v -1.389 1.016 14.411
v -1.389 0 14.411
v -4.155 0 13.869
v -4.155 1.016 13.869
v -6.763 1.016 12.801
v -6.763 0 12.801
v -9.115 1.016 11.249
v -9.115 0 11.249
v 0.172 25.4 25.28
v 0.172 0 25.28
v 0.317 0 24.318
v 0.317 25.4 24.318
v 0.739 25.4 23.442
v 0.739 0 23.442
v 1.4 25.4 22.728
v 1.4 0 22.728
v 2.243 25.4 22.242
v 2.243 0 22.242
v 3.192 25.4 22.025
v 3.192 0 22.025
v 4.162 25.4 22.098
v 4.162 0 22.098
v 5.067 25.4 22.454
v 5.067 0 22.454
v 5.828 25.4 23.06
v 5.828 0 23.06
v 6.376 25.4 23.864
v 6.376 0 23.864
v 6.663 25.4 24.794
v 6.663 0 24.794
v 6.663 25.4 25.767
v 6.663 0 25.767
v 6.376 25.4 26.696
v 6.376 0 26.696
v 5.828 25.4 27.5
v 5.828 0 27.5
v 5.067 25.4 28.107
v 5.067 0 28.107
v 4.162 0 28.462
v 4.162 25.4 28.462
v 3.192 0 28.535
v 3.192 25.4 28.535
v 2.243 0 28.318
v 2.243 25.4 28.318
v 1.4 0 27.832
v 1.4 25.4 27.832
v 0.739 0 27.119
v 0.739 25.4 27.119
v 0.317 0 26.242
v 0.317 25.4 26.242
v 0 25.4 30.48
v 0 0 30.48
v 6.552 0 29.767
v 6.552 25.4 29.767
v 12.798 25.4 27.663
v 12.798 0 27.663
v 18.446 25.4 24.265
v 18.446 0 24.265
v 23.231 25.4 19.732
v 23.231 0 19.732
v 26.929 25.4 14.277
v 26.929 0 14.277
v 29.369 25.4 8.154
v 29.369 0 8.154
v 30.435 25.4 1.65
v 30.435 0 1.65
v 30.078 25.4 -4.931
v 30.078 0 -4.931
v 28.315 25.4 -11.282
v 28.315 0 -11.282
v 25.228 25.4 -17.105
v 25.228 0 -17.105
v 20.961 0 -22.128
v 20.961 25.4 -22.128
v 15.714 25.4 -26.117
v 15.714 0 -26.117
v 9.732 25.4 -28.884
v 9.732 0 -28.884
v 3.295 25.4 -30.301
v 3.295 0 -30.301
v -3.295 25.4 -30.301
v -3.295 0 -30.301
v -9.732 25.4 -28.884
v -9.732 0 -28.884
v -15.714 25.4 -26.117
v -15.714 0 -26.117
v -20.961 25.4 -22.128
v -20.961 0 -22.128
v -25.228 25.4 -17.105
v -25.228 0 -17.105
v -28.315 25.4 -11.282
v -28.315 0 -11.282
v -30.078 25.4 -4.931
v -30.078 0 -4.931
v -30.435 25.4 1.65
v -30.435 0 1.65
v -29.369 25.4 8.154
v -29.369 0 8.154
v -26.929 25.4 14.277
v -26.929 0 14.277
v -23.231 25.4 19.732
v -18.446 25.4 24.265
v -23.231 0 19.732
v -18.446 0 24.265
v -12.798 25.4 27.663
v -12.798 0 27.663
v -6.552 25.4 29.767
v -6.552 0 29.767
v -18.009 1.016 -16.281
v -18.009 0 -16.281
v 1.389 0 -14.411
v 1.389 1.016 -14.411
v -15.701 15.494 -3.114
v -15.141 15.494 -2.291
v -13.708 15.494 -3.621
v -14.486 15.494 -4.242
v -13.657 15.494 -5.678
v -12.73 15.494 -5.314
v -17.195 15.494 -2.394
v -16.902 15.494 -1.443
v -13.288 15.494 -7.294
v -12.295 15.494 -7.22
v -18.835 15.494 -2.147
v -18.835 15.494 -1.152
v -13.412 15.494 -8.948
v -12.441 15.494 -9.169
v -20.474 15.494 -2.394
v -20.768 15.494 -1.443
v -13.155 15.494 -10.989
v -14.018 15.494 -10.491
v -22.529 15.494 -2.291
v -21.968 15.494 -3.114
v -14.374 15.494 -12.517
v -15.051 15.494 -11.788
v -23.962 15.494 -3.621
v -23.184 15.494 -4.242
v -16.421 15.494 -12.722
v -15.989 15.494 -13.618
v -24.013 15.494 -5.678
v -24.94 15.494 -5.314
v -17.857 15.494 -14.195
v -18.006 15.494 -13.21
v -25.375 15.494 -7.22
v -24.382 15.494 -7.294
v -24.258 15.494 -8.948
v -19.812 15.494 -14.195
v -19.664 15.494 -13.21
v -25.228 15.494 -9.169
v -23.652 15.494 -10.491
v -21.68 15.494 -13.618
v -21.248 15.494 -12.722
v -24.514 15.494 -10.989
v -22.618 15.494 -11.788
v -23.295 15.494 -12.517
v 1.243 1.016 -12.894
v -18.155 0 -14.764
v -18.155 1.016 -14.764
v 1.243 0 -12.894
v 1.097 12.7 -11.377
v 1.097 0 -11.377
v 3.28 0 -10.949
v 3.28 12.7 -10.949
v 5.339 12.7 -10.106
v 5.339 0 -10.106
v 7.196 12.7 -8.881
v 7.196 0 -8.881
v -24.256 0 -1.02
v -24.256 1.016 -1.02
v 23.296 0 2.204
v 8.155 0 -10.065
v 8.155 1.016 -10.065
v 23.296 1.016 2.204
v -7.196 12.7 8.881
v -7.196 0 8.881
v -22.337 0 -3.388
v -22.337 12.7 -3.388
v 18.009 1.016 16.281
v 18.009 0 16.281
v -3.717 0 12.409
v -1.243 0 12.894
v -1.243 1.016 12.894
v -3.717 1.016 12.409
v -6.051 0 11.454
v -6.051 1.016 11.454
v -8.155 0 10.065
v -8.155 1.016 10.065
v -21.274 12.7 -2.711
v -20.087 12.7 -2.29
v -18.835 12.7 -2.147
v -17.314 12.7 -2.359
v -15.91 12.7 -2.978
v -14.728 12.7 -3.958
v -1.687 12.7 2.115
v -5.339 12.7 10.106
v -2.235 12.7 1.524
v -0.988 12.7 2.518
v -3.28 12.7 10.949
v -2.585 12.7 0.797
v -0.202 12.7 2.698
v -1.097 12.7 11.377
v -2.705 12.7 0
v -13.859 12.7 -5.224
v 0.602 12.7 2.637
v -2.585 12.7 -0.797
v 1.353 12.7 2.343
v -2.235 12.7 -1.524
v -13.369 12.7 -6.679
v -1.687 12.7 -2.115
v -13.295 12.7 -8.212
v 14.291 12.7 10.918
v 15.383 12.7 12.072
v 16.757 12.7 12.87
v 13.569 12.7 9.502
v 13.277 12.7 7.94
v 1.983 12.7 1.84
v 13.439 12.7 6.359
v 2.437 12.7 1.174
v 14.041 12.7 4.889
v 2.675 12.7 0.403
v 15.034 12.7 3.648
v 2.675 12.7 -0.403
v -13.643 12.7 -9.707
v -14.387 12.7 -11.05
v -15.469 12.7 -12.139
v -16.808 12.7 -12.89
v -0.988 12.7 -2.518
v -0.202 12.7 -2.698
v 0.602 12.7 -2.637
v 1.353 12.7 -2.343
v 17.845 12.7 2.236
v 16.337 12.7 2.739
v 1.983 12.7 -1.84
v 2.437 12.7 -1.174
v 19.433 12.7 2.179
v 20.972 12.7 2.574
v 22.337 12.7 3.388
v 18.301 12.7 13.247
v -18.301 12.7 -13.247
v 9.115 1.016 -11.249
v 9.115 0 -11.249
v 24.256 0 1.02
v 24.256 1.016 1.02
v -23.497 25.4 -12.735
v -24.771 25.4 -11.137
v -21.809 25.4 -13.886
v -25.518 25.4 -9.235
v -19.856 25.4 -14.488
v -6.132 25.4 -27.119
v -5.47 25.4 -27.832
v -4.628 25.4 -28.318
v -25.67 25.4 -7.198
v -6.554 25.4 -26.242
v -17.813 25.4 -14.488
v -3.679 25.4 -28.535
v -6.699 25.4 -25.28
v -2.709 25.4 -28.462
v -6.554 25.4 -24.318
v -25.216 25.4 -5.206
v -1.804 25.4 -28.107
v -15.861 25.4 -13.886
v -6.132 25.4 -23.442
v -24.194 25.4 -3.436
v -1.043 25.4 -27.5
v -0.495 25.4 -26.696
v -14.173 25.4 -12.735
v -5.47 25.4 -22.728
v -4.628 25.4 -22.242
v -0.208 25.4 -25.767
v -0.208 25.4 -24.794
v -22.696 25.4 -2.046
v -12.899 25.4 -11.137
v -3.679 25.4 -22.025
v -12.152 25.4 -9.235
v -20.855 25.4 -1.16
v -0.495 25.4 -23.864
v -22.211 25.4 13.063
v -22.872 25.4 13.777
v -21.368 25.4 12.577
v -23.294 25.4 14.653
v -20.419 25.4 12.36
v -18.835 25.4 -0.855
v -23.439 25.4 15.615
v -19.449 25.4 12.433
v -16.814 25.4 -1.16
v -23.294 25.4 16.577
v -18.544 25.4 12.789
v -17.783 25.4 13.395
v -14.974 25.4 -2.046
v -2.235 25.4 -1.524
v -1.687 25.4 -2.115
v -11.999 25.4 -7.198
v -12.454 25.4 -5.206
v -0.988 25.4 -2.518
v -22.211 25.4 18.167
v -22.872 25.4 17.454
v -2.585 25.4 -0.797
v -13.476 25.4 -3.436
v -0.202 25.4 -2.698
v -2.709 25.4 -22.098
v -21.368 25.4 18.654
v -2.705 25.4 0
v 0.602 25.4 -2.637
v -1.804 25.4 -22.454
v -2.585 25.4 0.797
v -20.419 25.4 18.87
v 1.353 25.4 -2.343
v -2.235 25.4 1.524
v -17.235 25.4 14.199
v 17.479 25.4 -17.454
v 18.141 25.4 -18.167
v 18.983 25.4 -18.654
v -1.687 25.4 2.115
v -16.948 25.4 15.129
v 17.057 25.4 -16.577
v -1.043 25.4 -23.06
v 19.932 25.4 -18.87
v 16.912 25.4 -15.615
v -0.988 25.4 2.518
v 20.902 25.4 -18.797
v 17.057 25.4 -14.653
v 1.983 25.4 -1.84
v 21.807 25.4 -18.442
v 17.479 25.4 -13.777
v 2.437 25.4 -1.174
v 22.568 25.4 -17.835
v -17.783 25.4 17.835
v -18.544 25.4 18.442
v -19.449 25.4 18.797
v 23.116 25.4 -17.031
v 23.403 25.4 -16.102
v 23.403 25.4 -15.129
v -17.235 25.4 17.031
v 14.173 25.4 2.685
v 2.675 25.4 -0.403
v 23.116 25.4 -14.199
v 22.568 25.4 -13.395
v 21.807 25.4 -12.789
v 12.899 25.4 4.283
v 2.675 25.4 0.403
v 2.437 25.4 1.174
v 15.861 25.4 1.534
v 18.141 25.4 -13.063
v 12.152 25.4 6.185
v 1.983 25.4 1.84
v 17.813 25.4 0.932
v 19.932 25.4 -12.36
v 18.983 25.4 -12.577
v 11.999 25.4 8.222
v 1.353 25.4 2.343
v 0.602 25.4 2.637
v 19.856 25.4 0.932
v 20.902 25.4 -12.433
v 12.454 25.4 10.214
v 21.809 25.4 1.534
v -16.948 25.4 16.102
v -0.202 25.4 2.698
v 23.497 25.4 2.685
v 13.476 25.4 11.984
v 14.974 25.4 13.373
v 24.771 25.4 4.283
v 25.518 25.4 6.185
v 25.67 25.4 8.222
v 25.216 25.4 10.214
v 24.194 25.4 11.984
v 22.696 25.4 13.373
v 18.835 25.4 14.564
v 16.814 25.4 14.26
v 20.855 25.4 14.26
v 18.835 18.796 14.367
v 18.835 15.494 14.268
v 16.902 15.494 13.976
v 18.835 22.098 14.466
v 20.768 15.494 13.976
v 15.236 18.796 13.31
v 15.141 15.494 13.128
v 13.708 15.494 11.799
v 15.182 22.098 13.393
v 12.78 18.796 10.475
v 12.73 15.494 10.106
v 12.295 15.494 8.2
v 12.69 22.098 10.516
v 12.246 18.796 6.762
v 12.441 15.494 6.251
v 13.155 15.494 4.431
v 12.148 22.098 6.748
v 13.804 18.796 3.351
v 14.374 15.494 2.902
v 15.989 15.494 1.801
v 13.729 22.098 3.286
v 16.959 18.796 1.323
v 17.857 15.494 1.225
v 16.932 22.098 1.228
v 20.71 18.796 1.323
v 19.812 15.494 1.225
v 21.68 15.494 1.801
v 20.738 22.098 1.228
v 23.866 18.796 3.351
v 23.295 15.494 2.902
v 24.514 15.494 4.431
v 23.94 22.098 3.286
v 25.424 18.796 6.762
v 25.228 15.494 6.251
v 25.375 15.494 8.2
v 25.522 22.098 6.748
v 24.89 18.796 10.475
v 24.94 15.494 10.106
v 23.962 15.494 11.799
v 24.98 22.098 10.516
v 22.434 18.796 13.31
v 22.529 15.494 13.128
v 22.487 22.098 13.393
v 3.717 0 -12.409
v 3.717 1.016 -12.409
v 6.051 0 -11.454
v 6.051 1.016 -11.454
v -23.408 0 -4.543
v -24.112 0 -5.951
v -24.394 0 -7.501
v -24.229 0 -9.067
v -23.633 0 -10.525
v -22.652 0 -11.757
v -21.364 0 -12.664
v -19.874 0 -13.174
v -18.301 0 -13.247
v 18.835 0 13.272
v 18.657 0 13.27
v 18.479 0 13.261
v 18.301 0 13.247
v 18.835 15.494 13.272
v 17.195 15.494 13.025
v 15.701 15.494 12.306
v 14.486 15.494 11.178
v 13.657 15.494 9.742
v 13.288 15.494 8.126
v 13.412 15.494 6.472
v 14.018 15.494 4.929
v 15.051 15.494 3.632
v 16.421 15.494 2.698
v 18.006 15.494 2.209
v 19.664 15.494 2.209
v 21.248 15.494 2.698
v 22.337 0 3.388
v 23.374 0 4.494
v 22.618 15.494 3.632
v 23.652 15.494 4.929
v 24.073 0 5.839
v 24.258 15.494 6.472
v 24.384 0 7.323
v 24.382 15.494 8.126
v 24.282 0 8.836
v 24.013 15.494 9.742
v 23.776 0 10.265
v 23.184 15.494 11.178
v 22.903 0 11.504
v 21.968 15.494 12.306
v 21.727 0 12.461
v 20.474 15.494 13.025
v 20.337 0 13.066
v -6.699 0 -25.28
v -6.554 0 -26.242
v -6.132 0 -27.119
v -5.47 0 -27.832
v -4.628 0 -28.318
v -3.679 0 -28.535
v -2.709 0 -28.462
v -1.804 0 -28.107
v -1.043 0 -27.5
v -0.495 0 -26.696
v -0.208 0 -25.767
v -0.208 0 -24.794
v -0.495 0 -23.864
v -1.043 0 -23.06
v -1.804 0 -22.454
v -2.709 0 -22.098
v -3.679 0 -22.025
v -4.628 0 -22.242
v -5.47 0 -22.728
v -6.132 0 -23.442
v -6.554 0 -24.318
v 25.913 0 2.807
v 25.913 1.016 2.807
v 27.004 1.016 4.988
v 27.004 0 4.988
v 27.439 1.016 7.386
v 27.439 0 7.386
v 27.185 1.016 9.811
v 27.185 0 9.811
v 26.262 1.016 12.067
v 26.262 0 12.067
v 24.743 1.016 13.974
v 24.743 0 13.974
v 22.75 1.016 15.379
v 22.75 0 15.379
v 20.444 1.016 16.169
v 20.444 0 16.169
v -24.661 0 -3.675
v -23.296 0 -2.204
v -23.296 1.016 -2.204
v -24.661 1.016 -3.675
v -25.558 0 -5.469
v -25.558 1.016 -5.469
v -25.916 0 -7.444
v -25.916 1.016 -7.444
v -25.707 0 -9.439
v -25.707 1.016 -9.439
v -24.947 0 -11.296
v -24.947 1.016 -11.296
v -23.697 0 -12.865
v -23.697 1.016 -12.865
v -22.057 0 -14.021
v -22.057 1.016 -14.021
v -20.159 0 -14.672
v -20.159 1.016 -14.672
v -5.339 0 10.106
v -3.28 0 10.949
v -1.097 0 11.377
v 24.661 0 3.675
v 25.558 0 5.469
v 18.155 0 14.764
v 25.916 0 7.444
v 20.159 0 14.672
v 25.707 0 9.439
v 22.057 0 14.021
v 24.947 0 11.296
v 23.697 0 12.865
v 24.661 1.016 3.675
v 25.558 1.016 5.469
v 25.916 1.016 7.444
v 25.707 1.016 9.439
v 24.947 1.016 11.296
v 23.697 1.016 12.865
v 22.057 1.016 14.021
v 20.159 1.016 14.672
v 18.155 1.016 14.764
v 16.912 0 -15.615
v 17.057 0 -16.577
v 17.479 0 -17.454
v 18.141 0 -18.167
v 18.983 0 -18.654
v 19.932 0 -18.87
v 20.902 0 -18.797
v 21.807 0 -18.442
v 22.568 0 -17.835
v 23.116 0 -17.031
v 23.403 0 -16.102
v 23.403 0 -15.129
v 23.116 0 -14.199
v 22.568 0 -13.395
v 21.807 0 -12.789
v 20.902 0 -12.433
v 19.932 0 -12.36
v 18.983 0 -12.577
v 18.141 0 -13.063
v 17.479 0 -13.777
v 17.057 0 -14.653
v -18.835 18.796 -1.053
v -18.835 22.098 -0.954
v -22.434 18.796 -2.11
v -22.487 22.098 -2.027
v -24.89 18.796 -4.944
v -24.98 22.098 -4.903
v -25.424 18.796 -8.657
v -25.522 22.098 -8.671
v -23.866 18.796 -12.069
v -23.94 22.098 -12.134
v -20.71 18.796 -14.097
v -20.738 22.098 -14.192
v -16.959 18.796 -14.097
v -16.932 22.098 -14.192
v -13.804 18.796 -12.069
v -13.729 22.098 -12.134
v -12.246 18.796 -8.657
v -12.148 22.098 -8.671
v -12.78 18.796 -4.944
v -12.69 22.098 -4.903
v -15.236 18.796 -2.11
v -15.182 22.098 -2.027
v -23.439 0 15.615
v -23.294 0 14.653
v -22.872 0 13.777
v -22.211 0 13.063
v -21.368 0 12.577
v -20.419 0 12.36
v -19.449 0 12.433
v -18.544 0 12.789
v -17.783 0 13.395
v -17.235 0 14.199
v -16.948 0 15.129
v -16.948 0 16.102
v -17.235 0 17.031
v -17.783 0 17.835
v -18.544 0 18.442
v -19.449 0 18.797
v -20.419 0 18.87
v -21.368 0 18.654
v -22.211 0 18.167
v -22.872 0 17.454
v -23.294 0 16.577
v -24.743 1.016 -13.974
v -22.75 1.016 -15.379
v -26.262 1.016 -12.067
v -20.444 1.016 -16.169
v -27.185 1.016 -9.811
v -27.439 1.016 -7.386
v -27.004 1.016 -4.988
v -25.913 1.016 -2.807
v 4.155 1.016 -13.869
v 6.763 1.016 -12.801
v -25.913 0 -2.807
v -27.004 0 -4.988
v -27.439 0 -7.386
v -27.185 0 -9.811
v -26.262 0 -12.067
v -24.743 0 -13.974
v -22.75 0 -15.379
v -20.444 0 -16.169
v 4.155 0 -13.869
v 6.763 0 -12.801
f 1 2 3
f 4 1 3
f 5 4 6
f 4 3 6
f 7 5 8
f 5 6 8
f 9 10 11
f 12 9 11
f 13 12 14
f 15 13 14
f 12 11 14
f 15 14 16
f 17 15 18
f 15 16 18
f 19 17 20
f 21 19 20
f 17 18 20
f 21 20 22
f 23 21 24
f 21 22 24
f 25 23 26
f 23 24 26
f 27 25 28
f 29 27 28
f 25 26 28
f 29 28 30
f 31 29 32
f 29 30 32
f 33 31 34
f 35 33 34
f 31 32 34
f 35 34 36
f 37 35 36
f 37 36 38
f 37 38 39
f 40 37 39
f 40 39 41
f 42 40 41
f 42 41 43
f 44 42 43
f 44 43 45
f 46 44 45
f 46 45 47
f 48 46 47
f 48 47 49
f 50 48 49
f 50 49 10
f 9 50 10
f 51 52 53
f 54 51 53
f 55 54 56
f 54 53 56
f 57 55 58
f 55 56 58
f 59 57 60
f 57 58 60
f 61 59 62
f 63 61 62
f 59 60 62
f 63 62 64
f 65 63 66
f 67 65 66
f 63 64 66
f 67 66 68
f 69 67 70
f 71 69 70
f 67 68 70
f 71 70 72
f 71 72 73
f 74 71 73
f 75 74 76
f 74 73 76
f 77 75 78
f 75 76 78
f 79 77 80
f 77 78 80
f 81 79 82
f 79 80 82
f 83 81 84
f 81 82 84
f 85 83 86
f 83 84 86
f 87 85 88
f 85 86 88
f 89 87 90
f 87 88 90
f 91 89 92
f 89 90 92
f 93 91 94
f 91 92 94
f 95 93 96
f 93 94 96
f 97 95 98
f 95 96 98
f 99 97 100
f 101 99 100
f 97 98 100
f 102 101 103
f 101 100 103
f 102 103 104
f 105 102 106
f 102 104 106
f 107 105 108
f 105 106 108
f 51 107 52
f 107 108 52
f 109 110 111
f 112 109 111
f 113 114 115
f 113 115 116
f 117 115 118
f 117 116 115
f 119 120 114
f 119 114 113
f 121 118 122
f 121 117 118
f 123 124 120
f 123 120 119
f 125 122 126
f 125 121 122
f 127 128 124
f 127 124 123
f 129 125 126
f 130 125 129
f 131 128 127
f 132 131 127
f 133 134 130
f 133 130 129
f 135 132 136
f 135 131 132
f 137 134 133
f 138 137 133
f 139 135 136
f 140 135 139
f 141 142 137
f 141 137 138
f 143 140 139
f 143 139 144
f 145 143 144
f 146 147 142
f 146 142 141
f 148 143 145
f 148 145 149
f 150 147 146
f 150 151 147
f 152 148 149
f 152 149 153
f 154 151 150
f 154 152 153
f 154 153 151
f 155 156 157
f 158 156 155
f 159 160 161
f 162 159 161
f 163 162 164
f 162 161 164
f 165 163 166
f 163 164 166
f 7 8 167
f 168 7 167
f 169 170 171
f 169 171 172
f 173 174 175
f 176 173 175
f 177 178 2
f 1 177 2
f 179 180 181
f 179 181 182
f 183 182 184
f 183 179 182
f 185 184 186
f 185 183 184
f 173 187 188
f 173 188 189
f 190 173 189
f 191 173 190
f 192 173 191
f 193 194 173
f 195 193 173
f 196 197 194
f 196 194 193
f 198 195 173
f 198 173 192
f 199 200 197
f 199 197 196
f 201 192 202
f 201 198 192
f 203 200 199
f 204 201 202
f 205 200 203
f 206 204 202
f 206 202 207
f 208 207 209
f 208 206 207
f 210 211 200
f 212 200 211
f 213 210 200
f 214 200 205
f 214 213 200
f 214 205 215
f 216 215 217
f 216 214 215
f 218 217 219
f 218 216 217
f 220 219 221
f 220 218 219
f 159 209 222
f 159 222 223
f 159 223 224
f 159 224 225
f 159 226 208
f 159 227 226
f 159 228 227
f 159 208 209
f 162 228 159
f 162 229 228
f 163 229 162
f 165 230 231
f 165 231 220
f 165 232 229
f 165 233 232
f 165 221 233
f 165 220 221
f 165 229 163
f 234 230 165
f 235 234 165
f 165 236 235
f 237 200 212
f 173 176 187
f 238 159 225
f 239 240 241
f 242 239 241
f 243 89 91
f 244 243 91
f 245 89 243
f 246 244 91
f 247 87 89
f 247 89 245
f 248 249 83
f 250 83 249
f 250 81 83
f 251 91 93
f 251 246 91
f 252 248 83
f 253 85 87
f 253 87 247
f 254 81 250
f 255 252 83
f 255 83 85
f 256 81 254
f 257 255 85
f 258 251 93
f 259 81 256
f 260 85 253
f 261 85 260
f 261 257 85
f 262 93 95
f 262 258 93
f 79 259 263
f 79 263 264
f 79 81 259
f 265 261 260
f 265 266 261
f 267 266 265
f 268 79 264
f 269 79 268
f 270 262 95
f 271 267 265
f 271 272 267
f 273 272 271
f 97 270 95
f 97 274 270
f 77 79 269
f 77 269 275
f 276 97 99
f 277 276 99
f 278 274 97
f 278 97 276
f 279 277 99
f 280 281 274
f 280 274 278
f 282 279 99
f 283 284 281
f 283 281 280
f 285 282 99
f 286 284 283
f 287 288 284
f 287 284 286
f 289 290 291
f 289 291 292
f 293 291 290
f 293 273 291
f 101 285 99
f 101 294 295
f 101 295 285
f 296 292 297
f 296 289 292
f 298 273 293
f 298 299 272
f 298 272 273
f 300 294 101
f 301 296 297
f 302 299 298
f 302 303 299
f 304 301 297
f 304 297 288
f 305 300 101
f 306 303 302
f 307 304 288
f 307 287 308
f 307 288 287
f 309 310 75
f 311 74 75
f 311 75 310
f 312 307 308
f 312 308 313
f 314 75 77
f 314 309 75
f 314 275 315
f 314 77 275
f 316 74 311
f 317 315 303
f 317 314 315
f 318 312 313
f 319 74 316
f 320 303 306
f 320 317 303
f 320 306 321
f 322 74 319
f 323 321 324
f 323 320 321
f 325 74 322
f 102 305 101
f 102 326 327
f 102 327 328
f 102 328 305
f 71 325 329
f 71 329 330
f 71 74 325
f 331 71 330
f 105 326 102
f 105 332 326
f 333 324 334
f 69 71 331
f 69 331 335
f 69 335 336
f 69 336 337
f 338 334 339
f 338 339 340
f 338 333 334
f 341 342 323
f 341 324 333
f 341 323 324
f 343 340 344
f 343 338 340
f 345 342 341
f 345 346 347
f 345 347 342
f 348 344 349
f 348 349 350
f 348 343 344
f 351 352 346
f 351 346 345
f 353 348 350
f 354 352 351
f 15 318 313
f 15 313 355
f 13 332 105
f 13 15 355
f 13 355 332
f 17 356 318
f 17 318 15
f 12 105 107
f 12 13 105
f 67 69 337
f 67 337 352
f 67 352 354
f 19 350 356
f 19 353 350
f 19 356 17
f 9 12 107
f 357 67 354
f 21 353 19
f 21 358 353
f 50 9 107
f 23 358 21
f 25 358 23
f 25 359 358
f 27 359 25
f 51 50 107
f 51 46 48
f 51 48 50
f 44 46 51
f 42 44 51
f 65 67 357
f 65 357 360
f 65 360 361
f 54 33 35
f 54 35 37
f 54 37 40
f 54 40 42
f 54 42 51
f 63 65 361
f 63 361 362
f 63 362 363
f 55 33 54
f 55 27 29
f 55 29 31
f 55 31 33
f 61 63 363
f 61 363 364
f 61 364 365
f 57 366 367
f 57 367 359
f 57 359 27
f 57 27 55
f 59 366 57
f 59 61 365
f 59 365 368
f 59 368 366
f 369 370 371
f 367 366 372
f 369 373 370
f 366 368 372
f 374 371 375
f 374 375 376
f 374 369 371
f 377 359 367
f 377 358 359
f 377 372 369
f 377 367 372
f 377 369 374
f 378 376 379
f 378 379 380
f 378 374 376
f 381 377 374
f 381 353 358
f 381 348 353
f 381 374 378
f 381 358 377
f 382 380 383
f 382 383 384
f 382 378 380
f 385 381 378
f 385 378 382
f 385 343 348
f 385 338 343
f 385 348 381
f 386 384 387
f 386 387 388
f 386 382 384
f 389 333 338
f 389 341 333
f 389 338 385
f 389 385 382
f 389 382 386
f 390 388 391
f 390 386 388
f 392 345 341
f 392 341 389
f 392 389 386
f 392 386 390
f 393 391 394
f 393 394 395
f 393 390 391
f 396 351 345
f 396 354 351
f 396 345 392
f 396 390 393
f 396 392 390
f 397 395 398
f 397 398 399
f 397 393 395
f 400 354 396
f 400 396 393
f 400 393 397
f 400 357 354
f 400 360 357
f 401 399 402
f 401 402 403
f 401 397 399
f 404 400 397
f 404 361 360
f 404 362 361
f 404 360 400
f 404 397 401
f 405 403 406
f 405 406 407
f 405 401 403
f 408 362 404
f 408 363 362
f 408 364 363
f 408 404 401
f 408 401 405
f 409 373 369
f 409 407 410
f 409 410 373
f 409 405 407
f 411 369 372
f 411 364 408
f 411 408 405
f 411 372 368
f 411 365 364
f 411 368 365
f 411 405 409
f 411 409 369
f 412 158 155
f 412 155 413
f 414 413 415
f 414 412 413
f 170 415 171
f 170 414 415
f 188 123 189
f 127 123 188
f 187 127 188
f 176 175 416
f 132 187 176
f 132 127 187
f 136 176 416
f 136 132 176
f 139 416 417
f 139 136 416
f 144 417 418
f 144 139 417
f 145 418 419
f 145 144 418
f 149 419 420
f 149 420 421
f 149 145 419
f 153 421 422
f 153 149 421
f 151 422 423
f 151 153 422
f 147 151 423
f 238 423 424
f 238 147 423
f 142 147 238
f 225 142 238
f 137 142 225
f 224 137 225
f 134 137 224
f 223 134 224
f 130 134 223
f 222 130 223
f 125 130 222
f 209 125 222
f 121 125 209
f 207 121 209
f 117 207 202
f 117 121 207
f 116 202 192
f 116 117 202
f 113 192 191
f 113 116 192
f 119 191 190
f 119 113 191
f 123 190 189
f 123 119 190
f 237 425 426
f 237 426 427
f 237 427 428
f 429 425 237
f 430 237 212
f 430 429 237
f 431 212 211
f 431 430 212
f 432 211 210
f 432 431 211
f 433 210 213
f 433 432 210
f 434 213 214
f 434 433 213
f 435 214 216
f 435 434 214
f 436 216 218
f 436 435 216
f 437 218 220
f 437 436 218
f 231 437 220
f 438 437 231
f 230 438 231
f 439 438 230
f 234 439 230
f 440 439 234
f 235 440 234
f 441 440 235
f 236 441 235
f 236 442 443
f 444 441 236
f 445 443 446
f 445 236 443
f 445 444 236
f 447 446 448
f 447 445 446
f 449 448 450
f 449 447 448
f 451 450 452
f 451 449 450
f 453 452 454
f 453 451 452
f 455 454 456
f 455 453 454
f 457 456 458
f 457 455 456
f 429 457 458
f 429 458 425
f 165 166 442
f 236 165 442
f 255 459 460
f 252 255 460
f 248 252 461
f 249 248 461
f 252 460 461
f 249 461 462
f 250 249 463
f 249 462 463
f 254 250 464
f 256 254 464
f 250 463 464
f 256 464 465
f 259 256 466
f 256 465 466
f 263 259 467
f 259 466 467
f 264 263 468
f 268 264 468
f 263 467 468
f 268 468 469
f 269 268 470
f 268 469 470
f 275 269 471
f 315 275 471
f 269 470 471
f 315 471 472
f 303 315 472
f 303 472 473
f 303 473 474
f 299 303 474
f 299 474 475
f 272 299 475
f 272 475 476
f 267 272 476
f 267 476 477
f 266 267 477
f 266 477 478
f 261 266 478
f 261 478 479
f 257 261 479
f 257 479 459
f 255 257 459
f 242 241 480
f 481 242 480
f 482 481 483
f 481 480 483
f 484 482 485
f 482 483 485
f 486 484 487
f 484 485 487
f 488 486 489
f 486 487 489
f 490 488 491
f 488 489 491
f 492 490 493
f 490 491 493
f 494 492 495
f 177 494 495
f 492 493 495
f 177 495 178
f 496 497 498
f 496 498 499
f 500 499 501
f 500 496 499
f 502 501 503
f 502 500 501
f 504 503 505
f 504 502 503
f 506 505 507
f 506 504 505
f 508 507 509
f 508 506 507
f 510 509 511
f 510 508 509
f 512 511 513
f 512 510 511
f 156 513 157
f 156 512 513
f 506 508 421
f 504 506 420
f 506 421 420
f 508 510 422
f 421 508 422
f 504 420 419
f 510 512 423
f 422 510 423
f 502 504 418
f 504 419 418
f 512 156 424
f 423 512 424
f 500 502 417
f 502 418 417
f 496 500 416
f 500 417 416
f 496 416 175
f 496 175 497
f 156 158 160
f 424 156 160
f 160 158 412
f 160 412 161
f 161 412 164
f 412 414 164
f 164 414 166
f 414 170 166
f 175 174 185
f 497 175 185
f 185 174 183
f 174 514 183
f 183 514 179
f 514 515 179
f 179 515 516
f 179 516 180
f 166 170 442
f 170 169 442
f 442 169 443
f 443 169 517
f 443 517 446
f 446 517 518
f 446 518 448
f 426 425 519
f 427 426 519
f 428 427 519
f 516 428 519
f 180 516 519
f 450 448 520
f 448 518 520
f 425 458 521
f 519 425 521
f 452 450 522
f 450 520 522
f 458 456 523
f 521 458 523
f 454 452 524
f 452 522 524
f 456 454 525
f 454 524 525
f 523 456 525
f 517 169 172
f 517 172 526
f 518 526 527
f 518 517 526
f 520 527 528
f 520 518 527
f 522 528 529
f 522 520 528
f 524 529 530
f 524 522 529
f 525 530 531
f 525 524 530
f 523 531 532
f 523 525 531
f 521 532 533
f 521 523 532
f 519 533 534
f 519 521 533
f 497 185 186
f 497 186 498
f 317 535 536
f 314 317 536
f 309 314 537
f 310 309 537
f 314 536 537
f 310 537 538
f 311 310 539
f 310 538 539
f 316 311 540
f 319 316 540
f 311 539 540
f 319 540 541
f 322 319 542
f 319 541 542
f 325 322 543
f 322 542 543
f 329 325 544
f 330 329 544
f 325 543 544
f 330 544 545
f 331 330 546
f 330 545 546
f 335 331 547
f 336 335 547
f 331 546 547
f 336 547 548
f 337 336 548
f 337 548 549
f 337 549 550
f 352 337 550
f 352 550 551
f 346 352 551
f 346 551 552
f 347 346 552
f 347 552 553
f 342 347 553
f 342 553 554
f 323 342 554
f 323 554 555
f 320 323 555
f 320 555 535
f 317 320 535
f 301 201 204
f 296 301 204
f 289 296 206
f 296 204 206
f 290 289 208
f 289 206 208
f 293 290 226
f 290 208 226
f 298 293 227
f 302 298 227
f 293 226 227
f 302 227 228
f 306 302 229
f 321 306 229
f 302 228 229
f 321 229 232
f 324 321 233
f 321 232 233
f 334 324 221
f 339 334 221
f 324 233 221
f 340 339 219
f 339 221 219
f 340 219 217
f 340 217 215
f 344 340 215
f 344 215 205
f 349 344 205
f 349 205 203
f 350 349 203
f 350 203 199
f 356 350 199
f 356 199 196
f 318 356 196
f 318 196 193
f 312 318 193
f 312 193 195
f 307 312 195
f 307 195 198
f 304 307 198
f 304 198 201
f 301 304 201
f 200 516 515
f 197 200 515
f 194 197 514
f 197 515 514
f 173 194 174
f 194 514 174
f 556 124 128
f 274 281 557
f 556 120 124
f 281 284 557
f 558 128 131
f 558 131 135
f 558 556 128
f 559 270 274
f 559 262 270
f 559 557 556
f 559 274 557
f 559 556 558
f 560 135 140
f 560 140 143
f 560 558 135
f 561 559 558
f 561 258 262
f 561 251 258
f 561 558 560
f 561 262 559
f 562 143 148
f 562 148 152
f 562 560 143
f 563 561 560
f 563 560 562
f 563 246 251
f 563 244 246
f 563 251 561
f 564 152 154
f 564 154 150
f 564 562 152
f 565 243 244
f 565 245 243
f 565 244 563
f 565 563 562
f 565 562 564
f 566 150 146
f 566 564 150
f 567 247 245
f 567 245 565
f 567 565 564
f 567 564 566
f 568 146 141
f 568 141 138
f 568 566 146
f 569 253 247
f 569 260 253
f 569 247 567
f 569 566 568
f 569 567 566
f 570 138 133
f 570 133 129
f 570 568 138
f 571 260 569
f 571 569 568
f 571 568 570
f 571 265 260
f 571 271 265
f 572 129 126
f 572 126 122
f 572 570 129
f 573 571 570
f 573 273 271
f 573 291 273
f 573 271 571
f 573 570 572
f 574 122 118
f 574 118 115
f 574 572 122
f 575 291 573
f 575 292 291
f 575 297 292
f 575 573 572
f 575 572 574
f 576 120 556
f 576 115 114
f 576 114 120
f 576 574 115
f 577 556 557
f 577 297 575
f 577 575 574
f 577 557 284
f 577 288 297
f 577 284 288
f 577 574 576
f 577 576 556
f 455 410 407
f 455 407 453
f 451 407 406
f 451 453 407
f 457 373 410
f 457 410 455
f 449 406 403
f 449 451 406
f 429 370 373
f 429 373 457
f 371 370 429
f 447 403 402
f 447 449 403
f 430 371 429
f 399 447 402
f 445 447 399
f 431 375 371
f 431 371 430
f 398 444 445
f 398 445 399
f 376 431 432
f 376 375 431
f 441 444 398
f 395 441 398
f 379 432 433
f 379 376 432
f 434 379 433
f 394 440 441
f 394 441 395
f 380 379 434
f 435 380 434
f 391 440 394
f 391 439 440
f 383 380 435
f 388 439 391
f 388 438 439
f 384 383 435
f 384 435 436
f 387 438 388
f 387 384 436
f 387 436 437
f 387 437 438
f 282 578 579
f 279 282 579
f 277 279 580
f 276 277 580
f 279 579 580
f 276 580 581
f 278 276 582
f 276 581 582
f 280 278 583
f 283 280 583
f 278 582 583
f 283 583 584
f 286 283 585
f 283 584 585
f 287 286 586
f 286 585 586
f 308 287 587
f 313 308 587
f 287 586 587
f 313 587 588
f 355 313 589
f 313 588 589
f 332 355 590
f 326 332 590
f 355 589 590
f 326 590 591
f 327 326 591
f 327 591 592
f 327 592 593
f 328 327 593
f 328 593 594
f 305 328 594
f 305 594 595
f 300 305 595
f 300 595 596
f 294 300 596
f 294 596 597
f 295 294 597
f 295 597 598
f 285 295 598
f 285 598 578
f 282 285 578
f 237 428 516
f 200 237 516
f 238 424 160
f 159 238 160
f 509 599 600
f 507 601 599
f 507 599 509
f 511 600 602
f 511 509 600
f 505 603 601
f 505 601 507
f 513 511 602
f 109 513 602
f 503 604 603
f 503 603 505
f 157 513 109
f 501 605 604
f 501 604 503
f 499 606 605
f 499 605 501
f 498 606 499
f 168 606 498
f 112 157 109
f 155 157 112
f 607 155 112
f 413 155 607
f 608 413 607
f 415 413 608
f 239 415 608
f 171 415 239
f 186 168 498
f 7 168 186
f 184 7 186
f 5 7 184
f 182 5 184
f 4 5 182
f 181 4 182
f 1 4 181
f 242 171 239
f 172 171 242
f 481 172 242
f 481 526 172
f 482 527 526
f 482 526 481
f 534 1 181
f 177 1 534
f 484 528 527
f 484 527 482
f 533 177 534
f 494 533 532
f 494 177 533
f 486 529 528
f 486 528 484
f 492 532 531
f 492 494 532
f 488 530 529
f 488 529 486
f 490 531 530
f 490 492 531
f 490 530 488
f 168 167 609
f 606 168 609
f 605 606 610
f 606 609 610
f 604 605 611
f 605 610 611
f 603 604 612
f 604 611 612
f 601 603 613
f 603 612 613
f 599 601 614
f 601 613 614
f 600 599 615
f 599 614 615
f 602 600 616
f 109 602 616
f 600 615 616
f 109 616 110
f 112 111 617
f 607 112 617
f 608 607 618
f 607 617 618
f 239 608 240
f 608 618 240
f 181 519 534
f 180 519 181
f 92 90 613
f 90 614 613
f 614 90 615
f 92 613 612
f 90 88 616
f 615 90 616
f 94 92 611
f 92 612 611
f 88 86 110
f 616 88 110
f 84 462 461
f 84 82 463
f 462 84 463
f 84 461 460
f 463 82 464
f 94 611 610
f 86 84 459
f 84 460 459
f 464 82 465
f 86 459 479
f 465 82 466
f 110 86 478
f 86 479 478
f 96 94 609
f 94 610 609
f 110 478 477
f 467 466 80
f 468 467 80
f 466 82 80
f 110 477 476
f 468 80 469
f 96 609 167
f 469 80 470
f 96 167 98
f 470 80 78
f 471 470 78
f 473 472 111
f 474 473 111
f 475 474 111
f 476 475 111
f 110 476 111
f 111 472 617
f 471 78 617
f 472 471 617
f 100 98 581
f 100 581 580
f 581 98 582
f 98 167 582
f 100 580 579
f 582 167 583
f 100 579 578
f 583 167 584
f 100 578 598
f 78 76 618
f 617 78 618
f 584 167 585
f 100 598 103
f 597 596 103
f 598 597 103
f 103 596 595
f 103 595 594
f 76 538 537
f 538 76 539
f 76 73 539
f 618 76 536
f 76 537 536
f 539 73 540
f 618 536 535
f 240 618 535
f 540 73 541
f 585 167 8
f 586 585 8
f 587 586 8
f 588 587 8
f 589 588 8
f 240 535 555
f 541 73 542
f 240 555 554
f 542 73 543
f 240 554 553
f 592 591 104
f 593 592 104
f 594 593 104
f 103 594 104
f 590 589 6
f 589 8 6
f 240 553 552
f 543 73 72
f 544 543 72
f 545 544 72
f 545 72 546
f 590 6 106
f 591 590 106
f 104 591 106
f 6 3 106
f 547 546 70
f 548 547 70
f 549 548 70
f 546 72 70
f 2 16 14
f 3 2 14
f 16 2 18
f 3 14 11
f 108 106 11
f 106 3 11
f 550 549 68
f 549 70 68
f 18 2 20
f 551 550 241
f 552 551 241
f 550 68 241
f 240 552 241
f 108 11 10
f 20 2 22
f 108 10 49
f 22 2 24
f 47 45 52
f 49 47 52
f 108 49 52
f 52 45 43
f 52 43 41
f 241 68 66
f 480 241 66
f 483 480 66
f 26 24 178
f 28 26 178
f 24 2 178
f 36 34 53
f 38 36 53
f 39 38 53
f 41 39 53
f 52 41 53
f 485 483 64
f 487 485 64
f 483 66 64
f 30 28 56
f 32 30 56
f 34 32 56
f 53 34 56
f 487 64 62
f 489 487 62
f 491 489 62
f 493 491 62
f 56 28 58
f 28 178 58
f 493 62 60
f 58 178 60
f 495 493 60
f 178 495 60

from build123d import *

# Parameters (mm, degrees)
SKETCH1_R                         = 30.48
BOSS_EXTRUDE1_DEPTH               = 25.4
F_1_4_28_TAPPED_HOLE1_D           = 5.4102
SKETCH7_R                         = 11.43
CUT_EXTRUDE2_DEPTH                = 12.7
F_1_4_CLEARANCE_HOLE1_D           = 6.5278
F_1_4_NPT_TAPPED_HOLE1_AT_2_COUNT = 2
F_1_4_NPT_TAPPED_HOLE1_AT_2_PITCH = 40.7035
CUT_EXTRUDE3_DEPTH                = 12.7
GASKET_SLOT_DEPTH                 = 1.016


with BuildPart() as part:
    # Sketch1 → Boss-Extrude1 (new body)
    with BuildSketch(Plane(origin=(0, 0, 0), x_dir=(1, 0, 0), z_dir=(0, 1, 0))):
        with Locations(Location((0, 0, 0), (0, 0, 270))):
            Circle(SKETCH1_R)
    extrude(amount=BOSS_EXTRUDE1_DEPTH)

    # 1/4-28 Tapped Hole1 (through all)
    with Locations(Plane(origin=(0, 25.4, 0), x_dir=(1, 0, 0), z_dir=(0, 1, 0))):
        with Locations((0, 0)):
            Hole(F_1_4_28_TAPPED_HOLE1_D / 2)

    # Sketch7 → Cut-Extrude2 (cut)
    with BuildSketch(Plane.XZ):
        with Locations(Location((0, 0, 0), (0, 0, 270))):
            Circle(SKETCH7_R)
    extrude(amount=-CUT_EXTRUDE2_DEPTH, mode=Mode.SUBTRACT)

    # 1/4 Clearance Hole1 (through all)
    with Locations(Plane(origin=(0, 25.4, 0), x_dir=(1, 0, 0), z_dir=(0, 1, 0))):
        with Locations((20.175514493, 15.615257641), (3.435452557, -25.280136906), (-3.435452557, 25.280136906), (-20.175514493, -15.615257641)):
            Hole(F_1_4_CLEARANCE_HOLE1_D / 2)

    # Sketch12 → 1/4 NPT Tapped Hole1 (revolve, cut)
    with BuildSketch(Plane(origin=(-18.83486521, 25.4, -7.709836613), x_dir=(0, 0, 1), z_dir=(1, 0, 0))):
        Polygon((0, 0), (0, 25.4), (5.5626, 25.4), (5.5626, 9.906), (6.557984794, 9.906), (6.8545837, 0), align=None)
    f_1_4_npt_tapped_hole1 = revolve(axis=Axis((-18.83486521, 31.75, -7.709836613), (0, -1, 0)), mode=Mode.SUBTRACT)

    # 1/4 NPT Tapped Hole1 at 2: 1/4 NPT Tapped Hole1 ×2
    with Locations(*[Vector(0.9254666163685309, 0, 0.37882917256645177) * (i * F_1_4_NPT_TAPPED_HOLE1_AT_2_PITCH) for i in range(1, F_1_4_NPT_TAPPED_HOLE1_AT_2_COUNT)]):
        add(f_1_4_npt_tapped_hole1, mode=Mode.SUBTRACT)

    # Sketch13 → Cut-Extrude3 (cut)
    with BuildSketch(Plane.XZ):
        with BuildLine():
            Line((-7.195822597, 8.880598919), (-22.336832207, -3.387945139))
            ThreePointArc((-22.336832207, -3.387945139), (-23.98286581, -9.817111768), (-18.30123054, -13.246780969))
            Line((-18.30123054, -13.246780969), (1.096509596, -11.377282923))
            ThreePointArc((1.096509596, -11.377282923), (4.330017442, -10.578083425), (7.195822597, -8.880598919))
            Line((7.195822597, -8.880598919), (22.336832207, 3.387945139))
            ThreePointArc((22.336832207, 3.387945139), (23.98286581, 9.817111768), (18.30123054, 13.246780969))
            Line((18.30123054, 13.246780969), (-1.096509596, 11.377282923))
            ThreePointArc((-1.096509596, 11.377282923), (-4.330017442, 10.578083425), (-7.195822597, 8.880598919))
        make_face()
    extrude(amount=-CUT_EXTRUDE3_DEPTH, mode=Mode.SUBTRACT)

    # Sketch16 → gasket slot (cut)
    with BuildSketch(Plane.XZ):
        with BuildLine():
            Line((18.008827981, 16.280723081), (-1.388912154, 14.411225036))
            ThreePointArc((-1.388912154, 14.411225036), (-5.48468876, 13.398905672), (-9.114708623, 11.24875863))
            Line((-9.114708623, 11.24875863), (-24.255718233, -1.019785427))
            ThreePointArc((-24.255718233, -1.019785427), (-26.803688057, -10.971783086), (-18.008827981, -16.280723081))
            Line((-18.008827981, -16.280723081), (1.388912154, -14.411225036))
            ThreePointArc((1.388912154, -14.411225036), (5.48468876, -13.398905672), (9.114708623, -11.24875863))
            Line((9.114708623, -11.24875863), (24.255718233, 1.019785427))
            ThreePointArc((24.255718233, 1.019785427), (26.803688057, 10.971783086), (18.008827981, 16.280723081))
        make_face()
        with BuildLine():
            Line((18.15502926, 14.763752025), (-1.242710875, 12.894253979))
            ThreePointArc((-1.242710875, 12.894253979), (-4.907353101, 11.988494548), (-8.15526561, 10.064678774))
            Line((-8.15526561, 10.064678774), (-23.29627522, -2.203865283))
            ThreePointArc((-23.29627522, -2.203865283), (-25.393276933, -10.394447427), (-18.15502926, -14.763752025))
            Line((-18.15502926, -14.763752025), (1.242710875, -12.894253979))
            ThreePointArc((1.242710875, -12.894253979), (4.907353101, -11.988494548), (8.15526561, -10.064678774))
            Line((8.15526561, -10.064678774), (23.29627522, 2.203865283))
            ThreePointArc((23.29627522, 2.203865283), (25.393276933, 10.394447427), (18.15502926, 14.763752025))
        make_face(mode=Mode.SUBTRACT)
    extrude(amount=-GASKET_SLOT_DEPTH, mode=Mode.SUBTRACT)


solid = part.part
